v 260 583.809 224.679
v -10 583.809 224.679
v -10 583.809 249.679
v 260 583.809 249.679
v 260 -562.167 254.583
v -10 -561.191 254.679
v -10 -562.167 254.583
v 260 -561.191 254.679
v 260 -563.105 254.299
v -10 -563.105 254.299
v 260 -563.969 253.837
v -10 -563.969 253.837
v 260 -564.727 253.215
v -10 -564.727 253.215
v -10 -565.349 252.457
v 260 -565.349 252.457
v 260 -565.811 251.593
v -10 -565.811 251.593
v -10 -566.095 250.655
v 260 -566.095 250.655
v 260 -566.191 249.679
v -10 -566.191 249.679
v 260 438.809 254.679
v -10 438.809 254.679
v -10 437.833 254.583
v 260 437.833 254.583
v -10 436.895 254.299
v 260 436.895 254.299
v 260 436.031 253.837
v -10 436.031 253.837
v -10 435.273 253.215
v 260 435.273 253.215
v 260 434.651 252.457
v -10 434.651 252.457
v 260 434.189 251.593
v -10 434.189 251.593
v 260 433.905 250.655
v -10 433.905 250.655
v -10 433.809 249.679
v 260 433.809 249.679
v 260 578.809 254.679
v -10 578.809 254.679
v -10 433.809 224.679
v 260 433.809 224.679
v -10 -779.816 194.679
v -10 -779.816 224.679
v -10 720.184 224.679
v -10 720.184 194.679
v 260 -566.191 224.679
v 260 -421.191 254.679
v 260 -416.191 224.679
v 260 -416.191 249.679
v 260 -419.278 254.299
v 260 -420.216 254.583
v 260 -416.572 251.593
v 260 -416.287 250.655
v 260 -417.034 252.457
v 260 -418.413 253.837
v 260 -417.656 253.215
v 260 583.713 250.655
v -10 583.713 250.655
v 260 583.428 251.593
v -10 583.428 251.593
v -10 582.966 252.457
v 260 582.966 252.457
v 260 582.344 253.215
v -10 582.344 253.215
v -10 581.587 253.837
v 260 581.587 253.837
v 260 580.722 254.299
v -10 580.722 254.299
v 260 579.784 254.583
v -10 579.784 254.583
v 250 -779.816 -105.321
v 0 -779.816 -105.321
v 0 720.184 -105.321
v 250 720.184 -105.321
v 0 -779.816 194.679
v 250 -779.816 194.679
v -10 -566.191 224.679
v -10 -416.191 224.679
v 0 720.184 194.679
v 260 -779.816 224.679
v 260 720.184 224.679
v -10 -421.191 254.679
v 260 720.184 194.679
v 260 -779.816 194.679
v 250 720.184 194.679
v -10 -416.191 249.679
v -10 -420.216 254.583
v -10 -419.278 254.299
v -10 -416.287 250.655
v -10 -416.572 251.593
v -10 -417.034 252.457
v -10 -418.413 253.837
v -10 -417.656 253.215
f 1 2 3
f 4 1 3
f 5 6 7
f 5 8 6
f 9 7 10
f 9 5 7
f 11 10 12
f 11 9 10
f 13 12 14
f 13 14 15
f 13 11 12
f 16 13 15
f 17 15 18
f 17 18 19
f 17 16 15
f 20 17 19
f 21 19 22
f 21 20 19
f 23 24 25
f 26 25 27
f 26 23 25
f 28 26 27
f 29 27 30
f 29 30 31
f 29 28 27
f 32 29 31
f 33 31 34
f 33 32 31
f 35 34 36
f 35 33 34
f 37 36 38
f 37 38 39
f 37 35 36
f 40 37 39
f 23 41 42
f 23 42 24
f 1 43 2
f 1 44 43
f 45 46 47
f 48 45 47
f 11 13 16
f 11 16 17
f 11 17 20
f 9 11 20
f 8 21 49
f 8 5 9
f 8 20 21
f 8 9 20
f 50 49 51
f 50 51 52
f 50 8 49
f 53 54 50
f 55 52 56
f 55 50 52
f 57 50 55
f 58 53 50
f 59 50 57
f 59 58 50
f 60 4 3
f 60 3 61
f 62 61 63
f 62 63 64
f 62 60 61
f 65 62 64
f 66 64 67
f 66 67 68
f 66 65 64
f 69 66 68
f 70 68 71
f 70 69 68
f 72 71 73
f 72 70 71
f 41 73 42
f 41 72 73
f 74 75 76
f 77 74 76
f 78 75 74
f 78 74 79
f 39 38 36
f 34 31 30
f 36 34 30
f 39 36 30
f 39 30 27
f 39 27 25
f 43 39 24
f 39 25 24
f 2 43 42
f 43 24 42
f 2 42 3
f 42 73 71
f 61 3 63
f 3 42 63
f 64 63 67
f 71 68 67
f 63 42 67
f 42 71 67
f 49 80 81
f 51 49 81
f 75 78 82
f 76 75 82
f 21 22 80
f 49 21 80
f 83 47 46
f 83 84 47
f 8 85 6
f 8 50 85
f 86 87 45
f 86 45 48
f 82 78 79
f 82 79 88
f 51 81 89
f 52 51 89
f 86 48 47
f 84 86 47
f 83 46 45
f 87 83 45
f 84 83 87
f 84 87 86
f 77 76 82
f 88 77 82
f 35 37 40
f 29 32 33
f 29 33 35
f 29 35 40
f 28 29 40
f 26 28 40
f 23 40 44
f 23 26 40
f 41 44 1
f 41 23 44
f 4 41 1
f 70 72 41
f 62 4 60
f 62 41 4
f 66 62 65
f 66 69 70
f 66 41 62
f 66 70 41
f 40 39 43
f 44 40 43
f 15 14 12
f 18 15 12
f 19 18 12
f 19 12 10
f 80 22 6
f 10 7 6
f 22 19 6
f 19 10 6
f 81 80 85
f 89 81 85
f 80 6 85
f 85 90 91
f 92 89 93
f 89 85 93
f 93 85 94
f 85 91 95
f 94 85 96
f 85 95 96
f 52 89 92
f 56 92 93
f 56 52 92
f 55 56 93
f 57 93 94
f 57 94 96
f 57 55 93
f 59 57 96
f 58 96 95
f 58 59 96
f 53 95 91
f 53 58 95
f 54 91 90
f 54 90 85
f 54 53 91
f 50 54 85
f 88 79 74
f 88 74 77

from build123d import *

# Parameters (mm, degrees)
F0_W          = 1500
F0_H          = 300
F1_DEPTH      = 250
F2_DEPTH      = 260
F2_DEPTH_BACK = 10
F3_DEPTH      = 260
F3_DEPTH_BACK = 10


with BuildPart() as f1:
    # F0 (on Right) → F1 (new body)
    with BuildSketch(Plane.YZ):
        with Locations((-29.81638, 44.679458)):
            Rectangle(F0_W, F0_H)
    extrude(amount=F1_DEPTH)


with BuildPart() as f2:
    # F0 (on Right) → F2 (new body, two sides)
    with BuildSketch(Plane.YZ) as f2_sk:
        Polygon((-779.81638, 224.679458), (-779.81638, 194.679458), (720.18362, 194.679458), (720.18362, 224.679458), (583.808833, 224.679458), (433.808833, 224.679458), (-416.191167, 224.679458), (-566.191167, 224.679458), align=None)
    extrude(amount=F2_DEPTH)
    extrude(f2_sk.sketch, amount=-F2_DEPTH_BACK)


with BuildPart() as f3:
    # F0 (on Right) → F3 (new body, two sides)
    with BuildSketch(Plane.YZ) as f3_sk:
        with BuildLine():
            Line((-566.191167, 249.679458), (-566.191167, 224.679458))
            Line((-566.191167, 224.679458), (-416.191167, 224.679458))
            Line((-416.191167, 224.679458), (-416.191167, 249.679458))
            ThreePointArc((-416.191167, 249.679458), (-417.655633, 253.214991), (-421.191167, 254.679458))
            Line((-421.191167, 254.679458), (-561.191167, 254.679458))
            ThreePointArc((-561.191167, 254.679458), (-564.726701, 253.214991), (-566.191167, 249.679458))
        make_face()
        with BuildLine():
            Line((433.808833, 224.679458), (583.808833, 224.679458))
            Line((583.808833, 224.679458), (583.808833, 249.679458))
            ThreePointArc((583.808833, 249.679458), (582.344367, 253.214991), (578.808833, 254.679458))
            Line((578.808833, 254.679458), (438.808833, 254.679458))
            ThreePointArc((438.808833, 254.679458), (435.273299, 253.214991), (433.808833, 249.679458))
            Line((433.808833, 249.679458), (433.808833, 224.679458))
        make_face()
    extrude(amount=F3_DEPTH)
    extrude(f3_sk.sketch, amount=-F3_DEPTH_BACK)


solid = Compound([f1.part, f2.part, f3.part])
